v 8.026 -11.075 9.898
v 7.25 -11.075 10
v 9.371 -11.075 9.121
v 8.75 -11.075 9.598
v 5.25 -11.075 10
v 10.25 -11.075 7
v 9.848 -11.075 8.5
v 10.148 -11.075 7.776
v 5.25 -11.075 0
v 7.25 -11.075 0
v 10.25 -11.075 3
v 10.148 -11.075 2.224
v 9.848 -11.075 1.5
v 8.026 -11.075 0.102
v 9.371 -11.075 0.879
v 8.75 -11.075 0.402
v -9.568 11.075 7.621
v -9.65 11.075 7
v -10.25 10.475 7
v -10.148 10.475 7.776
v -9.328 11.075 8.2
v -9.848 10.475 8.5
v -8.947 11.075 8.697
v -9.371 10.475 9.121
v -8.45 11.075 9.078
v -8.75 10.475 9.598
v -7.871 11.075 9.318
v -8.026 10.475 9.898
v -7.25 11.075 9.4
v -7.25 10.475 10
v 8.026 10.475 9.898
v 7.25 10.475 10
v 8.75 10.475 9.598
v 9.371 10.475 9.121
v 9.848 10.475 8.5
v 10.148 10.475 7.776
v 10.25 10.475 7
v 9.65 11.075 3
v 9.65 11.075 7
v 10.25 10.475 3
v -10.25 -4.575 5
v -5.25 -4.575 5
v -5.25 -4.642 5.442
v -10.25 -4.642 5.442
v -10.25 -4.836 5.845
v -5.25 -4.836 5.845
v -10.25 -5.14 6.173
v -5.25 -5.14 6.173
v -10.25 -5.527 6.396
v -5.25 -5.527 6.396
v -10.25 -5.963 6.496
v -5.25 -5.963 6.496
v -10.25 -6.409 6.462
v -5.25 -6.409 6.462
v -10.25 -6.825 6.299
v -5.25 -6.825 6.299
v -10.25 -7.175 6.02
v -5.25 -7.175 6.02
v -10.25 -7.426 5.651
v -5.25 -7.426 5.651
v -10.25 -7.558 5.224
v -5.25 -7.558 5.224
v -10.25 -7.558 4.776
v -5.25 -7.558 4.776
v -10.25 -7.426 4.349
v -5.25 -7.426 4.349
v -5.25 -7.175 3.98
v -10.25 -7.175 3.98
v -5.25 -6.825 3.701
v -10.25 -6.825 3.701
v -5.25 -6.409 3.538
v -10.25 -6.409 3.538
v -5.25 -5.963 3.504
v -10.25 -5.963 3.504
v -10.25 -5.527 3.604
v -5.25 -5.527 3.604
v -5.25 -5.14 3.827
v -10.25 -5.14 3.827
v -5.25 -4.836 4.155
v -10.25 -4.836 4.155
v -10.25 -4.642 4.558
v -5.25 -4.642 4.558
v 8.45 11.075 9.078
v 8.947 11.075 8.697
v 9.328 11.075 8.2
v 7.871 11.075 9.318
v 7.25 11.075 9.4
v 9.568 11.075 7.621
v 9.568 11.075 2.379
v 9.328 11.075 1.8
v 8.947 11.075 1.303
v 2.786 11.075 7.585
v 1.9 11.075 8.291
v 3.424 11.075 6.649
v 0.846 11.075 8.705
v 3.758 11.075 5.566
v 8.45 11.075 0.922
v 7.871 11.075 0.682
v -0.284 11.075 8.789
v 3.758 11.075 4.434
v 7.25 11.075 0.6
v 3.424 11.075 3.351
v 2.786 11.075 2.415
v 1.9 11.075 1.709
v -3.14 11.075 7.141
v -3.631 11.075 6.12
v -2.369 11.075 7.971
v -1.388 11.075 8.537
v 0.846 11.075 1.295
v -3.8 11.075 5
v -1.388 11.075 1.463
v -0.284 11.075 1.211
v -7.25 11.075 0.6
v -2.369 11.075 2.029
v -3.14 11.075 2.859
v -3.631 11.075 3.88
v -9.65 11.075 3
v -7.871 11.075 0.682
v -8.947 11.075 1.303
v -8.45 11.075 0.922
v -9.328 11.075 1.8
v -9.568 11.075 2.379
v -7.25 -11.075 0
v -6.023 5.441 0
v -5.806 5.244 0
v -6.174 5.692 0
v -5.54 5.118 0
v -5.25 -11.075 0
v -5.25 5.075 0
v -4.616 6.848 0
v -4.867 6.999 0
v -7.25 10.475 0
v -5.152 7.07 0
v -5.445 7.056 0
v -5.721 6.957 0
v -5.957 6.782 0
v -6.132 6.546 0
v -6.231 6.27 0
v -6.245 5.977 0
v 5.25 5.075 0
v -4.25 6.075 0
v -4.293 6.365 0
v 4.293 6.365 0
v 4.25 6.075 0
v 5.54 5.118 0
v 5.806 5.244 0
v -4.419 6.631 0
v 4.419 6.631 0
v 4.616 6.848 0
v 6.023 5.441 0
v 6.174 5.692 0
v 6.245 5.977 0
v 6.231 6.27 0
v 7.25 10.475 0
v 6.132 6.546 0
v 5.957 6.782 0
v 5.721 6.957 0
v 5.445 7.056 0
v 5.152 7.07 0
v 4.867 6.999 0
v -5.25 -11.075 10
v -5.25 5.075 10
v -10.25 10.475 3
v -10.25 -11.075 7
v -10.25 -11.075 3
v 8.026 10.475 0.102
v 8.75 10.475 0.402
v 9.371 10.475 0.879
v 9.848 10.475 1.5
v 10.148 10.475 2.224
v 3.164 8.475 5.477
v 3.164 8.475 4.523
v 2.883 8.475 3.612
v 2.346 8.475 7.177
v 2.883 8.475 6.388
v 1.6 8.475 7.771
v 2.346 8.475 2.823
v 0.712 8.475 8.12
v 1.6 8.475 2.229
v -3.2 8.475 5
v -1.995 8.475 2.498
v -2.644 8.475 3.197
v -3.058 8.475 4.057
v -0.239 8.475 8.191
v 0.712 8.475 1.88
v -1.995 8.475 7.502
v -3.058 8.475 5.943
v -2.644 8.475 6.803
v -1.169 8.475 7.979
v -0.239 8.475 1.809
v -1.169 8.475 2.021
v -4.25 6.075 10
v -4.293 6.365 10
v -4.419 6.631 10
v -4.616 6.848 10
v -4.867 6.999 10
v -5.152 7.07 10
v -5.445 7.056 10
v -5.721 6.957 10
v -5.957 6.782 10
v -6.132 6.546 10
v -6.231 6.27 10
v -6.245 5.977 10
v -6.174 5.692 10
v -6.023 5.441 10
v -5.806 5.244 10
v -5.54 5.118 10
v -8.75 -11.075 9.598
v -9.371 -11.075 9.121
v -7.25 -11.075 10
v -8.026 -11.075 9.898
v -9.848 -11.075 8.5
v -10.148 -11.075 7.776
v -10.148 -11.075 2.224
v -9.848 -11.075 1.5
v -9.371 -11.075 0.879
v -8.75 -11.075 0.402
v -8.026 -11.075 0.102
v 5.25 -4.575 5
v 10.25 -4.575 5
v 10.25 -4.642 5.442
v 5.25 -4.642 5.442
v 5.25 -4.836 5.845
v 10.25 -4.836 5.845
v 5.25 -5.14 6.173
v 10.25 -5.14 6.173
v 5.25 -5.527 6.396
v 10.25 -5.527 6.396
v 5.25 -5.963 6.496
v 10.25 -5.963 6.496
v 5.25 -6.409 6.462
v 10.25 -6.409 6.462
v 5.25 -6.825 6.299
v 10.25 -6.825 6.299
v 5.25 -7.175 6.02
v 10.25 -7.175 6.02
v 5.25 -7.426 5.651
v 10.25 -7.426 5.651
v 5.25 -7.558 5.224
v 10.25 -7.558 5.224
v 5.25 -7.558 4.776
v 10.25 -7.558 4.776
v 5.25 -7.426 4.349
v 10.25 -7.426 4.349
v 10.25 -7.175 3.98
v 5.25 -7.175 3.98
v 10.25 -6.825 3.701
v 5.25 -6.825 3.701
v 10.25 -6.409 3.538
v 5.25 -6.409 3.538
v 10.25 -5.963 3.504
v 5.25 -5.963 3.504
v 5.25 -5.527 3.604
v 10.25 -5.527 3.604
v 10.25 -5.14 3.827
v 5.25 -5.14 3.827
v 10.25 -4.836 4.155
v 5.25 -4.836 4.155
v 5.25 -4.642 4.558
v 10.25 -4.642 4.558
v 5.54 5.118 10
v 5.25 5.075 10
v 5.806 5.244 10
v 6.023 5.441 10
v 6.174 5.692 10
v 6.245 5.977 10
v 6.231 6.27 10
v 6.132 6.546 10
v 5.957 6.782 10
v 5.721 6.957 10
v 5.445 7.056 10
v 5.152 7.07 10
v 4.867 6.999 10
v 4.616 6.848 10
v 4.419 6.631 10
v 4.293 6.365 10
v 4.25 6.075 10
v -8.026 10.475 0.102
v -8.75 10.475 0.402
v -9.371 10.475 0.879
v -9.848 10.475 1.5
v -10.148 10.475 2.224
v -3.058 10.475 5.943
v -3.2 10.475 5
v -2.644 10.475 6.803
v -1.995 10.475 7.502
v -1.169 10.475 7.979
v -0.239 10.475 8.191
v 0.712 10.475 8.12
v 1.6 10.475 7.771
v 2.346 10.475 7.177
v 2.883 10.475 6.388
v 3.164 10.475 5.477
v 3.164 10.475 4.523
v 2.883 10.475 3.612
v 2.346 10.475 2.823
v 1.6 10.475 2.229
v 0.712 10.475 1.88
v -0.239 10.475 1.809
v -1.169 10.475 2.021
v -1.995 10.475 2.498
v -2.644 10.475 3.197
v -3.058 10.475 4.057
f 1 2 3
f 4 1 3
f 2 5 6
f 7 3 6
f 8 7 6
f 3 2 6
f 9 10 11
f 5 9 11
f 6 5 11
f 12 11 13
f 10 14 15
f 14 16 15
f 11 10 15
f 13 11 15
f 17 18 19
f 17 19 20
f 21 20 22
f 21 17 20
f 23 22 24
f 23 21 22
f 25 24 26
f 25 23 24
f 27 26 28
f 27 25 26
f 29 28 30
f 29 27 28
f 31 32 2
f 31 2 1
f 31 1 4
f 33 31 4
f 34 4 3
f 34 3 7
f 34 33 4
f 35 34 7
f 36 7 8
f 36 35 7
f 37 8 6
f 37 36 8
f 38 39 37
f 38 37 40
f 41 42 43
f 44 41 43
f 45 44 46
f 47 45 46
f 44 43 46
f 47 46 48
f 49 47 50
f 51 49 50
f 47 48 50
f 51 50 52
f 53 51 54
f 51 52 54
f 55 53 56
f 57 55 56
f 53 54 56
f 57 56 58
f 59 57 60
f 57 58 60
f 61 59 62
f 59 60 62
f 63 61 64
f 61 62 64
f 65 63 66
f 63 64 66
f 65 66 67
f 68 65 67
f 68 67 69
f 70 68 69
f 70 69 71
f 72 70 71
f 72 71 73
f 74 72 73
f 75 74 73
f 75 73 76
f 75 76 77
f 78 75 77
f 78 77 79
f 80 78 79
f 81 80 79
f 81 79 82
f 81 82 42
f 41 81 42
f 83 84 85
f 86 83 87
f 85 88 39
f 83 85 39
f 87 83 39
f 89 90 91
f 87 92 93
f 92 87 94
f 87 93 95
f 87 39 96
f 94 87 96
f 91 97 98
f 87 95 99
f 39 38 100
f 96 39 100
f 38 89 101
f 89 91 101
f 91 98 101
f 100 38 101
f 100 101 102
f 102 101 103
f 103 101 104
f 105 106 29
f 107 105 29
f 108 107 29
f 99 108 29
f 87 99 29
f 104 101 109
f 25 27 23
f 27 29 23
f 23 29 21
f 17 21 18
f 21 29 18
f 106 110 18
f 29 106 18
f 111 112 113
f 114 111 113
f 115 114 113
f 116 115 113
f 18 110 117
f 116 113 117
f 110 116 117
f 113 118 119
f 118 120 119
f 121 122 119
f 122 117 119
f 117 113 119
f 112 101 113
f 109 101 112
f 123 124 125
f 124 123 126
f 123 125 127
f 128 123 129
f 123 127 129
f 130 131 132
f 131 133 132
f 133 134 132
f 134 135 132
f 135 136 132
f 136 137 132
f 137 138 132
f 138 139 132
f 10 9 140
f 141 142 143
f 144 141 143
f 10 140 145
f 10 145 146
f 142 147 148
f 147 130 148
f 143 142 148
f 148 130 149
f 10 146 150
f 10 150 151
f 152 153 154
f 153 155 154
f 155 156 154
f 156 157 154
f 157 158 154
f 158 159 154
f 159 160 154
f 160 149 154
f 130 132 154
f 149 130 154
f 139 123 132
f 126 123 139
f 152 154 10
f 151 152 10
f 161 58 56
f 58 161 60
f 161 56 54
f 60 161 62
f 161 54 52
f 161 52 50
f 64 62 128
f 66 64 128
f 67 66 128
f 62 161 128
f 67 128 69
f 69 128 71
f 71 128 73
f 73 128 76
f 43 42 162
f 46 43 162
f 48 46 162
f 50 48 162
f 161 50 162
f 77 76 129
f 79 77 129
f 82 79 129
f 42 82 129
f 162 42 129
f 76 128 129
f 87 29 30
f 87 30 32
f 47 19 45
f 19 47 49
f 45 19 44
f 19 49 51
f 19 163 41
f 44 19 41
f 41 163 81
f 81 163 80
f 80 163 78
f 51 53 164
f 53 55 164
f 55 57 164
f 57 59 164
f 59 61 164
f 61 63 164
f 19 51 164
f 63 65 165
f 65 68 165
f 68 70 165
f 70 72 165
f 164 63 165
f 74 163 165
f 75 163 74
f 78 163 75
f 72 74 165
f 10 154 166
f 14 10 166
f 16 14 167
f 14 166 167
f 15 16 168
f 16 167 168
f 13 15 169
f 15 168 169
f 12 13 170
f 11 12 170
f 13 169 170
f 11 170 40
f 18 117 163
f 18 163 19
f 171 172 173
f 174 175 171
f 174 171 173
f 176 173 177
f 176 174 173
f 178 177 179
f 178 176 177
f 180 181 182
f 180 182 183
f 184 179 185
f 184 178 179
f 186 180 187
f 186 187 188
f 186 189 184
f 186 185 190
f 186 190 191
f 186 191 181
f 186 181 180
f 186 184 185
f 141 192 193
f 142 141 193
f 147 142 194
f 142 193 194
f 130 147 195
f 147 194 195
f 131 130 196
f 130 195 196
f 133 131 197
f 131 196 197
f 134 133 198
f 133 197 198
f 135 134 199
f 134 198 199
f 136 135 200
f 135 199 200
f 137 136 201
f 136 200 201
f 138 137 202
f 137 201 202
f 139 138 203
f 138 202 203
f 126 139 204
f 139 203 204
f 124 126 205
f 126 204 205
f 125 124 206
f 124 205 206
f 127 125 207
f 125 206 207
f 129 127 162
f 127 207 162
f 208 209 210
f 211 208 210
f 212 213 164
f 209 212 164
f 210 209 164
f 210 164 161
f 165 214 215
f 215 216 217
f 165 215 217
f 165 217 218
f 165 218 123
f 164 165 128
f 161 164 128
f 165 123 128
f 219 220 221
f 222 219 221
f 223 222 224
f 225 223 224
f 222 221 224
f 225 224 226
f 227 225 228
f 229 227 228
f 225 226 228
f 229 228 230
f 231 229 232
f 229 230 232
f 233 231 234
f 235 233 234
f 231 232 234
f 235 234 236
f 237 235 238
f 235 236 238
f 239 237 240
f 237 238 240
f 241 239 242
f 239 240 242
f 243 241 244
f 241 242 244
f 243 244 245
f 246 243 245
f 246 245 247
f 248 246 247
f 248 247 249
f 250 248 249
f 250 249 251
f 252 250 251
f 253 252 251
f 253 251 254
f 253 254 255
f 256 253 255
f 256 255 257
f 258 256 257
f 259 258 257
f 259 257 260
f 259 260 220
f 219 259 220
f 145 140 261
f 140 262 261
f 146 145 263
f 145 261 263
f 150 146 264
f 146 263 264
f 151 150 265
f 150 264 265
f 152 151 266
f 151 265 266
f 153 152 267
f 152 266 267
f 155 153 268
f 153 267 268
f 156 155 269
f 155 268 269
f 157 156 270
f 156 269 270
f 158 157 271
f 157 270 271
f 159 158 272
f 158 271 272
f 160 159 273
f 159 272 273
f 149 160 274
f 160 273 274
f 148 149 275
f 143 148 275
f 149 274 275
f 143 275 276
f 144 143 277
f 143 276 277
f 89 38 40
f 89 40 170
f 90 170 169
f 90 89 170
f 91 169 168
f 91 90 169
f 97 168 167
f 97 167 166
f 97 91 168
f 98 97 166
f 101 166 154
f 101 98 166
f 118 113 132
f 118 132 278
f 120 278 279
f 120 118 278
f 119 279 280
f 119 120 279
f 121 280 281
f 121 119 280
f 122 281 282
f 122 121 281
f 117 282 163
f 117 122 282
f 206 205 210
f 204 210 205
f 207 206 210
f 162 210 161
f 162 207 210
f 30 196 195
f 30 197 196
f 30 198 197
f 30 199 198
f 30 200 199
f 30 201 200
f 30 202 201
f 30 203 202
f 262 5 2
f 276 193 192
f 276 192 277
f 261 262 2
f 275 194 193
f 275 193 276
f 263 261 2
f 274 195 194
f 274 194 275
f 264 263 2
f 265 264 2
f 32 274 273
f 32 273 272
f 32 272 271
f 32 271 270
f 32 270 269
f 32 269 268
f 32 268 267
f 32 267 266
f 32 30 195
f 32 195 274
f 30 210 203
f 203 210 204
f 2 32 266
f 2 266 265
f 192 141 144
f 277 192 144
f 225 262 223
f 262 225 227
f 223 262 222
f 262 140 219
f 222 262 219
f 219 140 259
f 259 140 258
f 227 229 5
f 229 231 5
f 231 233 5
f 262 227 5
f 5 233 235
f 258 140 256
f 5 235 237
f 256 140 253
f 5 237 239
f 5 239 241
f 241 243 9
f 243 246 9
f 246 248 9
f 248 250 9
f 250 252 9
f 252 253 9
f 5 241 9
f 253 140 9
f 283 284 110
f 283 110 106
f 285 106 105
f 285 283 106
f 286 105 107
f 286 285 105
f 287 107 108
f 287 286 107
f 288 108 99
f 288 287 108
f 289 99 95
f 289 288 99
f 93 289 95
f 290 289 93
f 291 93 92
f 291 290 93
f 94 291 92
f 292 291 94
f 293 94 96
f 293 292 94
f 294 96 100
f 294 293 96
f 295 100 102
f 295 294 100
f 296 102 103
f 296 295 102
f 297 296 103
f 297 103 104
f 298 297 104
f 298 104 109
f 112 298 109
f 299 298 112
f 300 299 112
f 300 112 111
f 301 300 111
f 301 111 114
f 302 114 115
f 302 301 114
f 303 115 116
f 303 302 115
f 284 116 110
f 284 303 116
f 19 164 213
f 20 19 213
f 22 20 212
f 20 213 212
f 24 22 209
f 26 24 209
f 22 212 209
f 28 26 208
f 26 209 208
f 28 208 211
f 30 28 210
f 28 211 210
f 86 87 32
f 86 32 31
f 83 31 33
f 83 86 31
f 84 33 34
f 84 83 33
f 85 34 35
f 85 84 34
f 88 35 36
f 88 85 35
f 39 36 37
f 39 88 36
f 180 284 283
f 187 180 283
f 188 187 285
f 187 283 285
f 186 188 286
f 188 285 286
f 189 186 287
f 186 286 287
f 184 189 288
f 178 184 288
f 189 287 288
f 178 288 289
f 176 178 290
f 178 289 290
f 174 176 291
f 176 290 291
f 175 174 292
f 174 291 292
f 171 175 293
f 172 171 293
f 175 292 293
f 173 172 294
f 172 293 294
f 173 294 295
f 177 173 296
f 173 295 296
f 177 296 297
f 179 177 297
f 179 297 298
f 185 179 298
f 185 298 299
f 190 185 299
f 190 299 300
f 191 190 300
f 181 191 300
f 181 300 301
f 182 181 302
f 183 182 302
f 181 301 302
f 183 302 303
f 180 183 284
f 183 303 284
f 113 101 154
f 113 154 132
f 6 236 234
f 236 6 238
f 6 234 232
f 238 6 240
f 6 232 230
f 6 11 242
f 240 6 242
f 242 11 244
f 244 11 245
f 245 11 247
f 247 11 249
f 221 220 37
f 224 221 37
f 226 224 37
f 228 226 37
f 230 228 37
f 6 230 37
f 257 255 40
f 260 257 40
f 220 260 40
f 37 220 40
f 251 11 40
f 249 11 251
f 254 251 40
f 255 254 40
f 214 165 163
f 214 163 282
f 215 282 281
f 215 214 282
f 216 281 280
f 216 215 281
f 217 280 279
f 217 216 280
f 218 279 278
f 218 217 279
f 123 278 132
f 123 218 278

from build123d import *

# Parameters (mm, degrees)
EXTRUDE_1_DEPTH     = 10
SKETCH_2_R          = 3.2
CUT_EXTRUDE_1_DEPTH = 2.6
SKETCH_3_R          = 1.5
CUT_EXTRUDE_2_DEPTH = 26.355583705
FILLET_1_R          = 3
CHAMFER_1_SIZE      = 0.6
SKETCH_4_R          = 1
CUT_EXTRUDE_3_DEPTH = 19.102986632


with BuildPart() as part:
    # ｽｹｯﾁ1 → ﾎﾞｽ - 押し出し1 (new body)
    with BuildSketch(Plane.XY):
        Polygon((-10.25, 11.075), (-10.25, -11.075), (-5.25, -11.075), (-5.25, 6.075), (5.25, 6.075), (5.25, -11.075), (10.25, -11.075), (10.25, 11.075), align=None)
    extrude(amount=EXTRUDE_1_DEPTH)

    # ｽｹｯﾁ2 → ｶｯﾄ - 押し出し1 (cut)
    with BuildSketch(Plane(origin=(0, 11.075, 0), x_dir=(1, 0, 0), z_dir=(0, 1, 0))):
        with Locations(Location((0, -5, 0), (0, 0, 180))):
            Circle(SKETCH_2_R)
    extrude(amount=-CUT_EXTRUDE_1_DEPTH, mode=Mode.SUBTRACT)

    # ｽｹｯﾁ3 → ｶｯﾄ - 押し出し2 (cut, through all)
    with BuildSketch(Plane(origin=(10.25, 0, 0), x_dir=(0, 0, -1), z_dir=(1, 0, 0))):
        with Locations(Location((-5, -6.075, 0), (0, 0, 90))):
            Circle(SKETCH_3_R)
    extrude(amount=-CUT_EXTRUDE_2_DEPTH, mode=Mode.SUBTRACT)

    # ﾌｨﾚｯﾄ1
    fillet_1_edges = [part.edges().sort_by_distance(p)[0] for p in [
        (-10.25, 0, 0),
        (10.25, 0, 0),
        (10.25, 0, 10),
        (-10.25, 0, 10),
    ]]
    fillet(fillet_1_edges, radius=FILLET_1_R)

    # 面取り1
    chamfer_1_edges = [part.edges().sort_by_distance(p)[0] for p in [
        (3.2, 11.075, 5),
        (-10.25, 11.075, 5),
        (0, 11.075, 0),
        (0, 11.075, 10),
        (10.25, 11.075, 5),
        (9.371320344, 11.075, 9.121320344),
        (9.371320344, 11.075, 0.878679656),
        (-9.371320344, 11.075, 0.878679656),
        (-9.371320344, 11.075, 9.121320344),
    ]]
    chamfer(chamfer_1_edges, length=CHAMFER_1_SIZE)

    # ｽｹｯﾁ4 → ｶｯﾄ - 押し出し3 (cut, through all)
    with BuildSketch(Plane.XY.offset(10)):
        with Locations((5.25, 6.075)):
            Circle(SKETCH_4_R)
        with Locations((-5.25, 6.075)):
            Circle(SKETCH_4_R)
    extrude(amount=-CUT_EXTRUDE_3_DEPTH, mode=Mode.SUBTRACT)


solid = part.part
